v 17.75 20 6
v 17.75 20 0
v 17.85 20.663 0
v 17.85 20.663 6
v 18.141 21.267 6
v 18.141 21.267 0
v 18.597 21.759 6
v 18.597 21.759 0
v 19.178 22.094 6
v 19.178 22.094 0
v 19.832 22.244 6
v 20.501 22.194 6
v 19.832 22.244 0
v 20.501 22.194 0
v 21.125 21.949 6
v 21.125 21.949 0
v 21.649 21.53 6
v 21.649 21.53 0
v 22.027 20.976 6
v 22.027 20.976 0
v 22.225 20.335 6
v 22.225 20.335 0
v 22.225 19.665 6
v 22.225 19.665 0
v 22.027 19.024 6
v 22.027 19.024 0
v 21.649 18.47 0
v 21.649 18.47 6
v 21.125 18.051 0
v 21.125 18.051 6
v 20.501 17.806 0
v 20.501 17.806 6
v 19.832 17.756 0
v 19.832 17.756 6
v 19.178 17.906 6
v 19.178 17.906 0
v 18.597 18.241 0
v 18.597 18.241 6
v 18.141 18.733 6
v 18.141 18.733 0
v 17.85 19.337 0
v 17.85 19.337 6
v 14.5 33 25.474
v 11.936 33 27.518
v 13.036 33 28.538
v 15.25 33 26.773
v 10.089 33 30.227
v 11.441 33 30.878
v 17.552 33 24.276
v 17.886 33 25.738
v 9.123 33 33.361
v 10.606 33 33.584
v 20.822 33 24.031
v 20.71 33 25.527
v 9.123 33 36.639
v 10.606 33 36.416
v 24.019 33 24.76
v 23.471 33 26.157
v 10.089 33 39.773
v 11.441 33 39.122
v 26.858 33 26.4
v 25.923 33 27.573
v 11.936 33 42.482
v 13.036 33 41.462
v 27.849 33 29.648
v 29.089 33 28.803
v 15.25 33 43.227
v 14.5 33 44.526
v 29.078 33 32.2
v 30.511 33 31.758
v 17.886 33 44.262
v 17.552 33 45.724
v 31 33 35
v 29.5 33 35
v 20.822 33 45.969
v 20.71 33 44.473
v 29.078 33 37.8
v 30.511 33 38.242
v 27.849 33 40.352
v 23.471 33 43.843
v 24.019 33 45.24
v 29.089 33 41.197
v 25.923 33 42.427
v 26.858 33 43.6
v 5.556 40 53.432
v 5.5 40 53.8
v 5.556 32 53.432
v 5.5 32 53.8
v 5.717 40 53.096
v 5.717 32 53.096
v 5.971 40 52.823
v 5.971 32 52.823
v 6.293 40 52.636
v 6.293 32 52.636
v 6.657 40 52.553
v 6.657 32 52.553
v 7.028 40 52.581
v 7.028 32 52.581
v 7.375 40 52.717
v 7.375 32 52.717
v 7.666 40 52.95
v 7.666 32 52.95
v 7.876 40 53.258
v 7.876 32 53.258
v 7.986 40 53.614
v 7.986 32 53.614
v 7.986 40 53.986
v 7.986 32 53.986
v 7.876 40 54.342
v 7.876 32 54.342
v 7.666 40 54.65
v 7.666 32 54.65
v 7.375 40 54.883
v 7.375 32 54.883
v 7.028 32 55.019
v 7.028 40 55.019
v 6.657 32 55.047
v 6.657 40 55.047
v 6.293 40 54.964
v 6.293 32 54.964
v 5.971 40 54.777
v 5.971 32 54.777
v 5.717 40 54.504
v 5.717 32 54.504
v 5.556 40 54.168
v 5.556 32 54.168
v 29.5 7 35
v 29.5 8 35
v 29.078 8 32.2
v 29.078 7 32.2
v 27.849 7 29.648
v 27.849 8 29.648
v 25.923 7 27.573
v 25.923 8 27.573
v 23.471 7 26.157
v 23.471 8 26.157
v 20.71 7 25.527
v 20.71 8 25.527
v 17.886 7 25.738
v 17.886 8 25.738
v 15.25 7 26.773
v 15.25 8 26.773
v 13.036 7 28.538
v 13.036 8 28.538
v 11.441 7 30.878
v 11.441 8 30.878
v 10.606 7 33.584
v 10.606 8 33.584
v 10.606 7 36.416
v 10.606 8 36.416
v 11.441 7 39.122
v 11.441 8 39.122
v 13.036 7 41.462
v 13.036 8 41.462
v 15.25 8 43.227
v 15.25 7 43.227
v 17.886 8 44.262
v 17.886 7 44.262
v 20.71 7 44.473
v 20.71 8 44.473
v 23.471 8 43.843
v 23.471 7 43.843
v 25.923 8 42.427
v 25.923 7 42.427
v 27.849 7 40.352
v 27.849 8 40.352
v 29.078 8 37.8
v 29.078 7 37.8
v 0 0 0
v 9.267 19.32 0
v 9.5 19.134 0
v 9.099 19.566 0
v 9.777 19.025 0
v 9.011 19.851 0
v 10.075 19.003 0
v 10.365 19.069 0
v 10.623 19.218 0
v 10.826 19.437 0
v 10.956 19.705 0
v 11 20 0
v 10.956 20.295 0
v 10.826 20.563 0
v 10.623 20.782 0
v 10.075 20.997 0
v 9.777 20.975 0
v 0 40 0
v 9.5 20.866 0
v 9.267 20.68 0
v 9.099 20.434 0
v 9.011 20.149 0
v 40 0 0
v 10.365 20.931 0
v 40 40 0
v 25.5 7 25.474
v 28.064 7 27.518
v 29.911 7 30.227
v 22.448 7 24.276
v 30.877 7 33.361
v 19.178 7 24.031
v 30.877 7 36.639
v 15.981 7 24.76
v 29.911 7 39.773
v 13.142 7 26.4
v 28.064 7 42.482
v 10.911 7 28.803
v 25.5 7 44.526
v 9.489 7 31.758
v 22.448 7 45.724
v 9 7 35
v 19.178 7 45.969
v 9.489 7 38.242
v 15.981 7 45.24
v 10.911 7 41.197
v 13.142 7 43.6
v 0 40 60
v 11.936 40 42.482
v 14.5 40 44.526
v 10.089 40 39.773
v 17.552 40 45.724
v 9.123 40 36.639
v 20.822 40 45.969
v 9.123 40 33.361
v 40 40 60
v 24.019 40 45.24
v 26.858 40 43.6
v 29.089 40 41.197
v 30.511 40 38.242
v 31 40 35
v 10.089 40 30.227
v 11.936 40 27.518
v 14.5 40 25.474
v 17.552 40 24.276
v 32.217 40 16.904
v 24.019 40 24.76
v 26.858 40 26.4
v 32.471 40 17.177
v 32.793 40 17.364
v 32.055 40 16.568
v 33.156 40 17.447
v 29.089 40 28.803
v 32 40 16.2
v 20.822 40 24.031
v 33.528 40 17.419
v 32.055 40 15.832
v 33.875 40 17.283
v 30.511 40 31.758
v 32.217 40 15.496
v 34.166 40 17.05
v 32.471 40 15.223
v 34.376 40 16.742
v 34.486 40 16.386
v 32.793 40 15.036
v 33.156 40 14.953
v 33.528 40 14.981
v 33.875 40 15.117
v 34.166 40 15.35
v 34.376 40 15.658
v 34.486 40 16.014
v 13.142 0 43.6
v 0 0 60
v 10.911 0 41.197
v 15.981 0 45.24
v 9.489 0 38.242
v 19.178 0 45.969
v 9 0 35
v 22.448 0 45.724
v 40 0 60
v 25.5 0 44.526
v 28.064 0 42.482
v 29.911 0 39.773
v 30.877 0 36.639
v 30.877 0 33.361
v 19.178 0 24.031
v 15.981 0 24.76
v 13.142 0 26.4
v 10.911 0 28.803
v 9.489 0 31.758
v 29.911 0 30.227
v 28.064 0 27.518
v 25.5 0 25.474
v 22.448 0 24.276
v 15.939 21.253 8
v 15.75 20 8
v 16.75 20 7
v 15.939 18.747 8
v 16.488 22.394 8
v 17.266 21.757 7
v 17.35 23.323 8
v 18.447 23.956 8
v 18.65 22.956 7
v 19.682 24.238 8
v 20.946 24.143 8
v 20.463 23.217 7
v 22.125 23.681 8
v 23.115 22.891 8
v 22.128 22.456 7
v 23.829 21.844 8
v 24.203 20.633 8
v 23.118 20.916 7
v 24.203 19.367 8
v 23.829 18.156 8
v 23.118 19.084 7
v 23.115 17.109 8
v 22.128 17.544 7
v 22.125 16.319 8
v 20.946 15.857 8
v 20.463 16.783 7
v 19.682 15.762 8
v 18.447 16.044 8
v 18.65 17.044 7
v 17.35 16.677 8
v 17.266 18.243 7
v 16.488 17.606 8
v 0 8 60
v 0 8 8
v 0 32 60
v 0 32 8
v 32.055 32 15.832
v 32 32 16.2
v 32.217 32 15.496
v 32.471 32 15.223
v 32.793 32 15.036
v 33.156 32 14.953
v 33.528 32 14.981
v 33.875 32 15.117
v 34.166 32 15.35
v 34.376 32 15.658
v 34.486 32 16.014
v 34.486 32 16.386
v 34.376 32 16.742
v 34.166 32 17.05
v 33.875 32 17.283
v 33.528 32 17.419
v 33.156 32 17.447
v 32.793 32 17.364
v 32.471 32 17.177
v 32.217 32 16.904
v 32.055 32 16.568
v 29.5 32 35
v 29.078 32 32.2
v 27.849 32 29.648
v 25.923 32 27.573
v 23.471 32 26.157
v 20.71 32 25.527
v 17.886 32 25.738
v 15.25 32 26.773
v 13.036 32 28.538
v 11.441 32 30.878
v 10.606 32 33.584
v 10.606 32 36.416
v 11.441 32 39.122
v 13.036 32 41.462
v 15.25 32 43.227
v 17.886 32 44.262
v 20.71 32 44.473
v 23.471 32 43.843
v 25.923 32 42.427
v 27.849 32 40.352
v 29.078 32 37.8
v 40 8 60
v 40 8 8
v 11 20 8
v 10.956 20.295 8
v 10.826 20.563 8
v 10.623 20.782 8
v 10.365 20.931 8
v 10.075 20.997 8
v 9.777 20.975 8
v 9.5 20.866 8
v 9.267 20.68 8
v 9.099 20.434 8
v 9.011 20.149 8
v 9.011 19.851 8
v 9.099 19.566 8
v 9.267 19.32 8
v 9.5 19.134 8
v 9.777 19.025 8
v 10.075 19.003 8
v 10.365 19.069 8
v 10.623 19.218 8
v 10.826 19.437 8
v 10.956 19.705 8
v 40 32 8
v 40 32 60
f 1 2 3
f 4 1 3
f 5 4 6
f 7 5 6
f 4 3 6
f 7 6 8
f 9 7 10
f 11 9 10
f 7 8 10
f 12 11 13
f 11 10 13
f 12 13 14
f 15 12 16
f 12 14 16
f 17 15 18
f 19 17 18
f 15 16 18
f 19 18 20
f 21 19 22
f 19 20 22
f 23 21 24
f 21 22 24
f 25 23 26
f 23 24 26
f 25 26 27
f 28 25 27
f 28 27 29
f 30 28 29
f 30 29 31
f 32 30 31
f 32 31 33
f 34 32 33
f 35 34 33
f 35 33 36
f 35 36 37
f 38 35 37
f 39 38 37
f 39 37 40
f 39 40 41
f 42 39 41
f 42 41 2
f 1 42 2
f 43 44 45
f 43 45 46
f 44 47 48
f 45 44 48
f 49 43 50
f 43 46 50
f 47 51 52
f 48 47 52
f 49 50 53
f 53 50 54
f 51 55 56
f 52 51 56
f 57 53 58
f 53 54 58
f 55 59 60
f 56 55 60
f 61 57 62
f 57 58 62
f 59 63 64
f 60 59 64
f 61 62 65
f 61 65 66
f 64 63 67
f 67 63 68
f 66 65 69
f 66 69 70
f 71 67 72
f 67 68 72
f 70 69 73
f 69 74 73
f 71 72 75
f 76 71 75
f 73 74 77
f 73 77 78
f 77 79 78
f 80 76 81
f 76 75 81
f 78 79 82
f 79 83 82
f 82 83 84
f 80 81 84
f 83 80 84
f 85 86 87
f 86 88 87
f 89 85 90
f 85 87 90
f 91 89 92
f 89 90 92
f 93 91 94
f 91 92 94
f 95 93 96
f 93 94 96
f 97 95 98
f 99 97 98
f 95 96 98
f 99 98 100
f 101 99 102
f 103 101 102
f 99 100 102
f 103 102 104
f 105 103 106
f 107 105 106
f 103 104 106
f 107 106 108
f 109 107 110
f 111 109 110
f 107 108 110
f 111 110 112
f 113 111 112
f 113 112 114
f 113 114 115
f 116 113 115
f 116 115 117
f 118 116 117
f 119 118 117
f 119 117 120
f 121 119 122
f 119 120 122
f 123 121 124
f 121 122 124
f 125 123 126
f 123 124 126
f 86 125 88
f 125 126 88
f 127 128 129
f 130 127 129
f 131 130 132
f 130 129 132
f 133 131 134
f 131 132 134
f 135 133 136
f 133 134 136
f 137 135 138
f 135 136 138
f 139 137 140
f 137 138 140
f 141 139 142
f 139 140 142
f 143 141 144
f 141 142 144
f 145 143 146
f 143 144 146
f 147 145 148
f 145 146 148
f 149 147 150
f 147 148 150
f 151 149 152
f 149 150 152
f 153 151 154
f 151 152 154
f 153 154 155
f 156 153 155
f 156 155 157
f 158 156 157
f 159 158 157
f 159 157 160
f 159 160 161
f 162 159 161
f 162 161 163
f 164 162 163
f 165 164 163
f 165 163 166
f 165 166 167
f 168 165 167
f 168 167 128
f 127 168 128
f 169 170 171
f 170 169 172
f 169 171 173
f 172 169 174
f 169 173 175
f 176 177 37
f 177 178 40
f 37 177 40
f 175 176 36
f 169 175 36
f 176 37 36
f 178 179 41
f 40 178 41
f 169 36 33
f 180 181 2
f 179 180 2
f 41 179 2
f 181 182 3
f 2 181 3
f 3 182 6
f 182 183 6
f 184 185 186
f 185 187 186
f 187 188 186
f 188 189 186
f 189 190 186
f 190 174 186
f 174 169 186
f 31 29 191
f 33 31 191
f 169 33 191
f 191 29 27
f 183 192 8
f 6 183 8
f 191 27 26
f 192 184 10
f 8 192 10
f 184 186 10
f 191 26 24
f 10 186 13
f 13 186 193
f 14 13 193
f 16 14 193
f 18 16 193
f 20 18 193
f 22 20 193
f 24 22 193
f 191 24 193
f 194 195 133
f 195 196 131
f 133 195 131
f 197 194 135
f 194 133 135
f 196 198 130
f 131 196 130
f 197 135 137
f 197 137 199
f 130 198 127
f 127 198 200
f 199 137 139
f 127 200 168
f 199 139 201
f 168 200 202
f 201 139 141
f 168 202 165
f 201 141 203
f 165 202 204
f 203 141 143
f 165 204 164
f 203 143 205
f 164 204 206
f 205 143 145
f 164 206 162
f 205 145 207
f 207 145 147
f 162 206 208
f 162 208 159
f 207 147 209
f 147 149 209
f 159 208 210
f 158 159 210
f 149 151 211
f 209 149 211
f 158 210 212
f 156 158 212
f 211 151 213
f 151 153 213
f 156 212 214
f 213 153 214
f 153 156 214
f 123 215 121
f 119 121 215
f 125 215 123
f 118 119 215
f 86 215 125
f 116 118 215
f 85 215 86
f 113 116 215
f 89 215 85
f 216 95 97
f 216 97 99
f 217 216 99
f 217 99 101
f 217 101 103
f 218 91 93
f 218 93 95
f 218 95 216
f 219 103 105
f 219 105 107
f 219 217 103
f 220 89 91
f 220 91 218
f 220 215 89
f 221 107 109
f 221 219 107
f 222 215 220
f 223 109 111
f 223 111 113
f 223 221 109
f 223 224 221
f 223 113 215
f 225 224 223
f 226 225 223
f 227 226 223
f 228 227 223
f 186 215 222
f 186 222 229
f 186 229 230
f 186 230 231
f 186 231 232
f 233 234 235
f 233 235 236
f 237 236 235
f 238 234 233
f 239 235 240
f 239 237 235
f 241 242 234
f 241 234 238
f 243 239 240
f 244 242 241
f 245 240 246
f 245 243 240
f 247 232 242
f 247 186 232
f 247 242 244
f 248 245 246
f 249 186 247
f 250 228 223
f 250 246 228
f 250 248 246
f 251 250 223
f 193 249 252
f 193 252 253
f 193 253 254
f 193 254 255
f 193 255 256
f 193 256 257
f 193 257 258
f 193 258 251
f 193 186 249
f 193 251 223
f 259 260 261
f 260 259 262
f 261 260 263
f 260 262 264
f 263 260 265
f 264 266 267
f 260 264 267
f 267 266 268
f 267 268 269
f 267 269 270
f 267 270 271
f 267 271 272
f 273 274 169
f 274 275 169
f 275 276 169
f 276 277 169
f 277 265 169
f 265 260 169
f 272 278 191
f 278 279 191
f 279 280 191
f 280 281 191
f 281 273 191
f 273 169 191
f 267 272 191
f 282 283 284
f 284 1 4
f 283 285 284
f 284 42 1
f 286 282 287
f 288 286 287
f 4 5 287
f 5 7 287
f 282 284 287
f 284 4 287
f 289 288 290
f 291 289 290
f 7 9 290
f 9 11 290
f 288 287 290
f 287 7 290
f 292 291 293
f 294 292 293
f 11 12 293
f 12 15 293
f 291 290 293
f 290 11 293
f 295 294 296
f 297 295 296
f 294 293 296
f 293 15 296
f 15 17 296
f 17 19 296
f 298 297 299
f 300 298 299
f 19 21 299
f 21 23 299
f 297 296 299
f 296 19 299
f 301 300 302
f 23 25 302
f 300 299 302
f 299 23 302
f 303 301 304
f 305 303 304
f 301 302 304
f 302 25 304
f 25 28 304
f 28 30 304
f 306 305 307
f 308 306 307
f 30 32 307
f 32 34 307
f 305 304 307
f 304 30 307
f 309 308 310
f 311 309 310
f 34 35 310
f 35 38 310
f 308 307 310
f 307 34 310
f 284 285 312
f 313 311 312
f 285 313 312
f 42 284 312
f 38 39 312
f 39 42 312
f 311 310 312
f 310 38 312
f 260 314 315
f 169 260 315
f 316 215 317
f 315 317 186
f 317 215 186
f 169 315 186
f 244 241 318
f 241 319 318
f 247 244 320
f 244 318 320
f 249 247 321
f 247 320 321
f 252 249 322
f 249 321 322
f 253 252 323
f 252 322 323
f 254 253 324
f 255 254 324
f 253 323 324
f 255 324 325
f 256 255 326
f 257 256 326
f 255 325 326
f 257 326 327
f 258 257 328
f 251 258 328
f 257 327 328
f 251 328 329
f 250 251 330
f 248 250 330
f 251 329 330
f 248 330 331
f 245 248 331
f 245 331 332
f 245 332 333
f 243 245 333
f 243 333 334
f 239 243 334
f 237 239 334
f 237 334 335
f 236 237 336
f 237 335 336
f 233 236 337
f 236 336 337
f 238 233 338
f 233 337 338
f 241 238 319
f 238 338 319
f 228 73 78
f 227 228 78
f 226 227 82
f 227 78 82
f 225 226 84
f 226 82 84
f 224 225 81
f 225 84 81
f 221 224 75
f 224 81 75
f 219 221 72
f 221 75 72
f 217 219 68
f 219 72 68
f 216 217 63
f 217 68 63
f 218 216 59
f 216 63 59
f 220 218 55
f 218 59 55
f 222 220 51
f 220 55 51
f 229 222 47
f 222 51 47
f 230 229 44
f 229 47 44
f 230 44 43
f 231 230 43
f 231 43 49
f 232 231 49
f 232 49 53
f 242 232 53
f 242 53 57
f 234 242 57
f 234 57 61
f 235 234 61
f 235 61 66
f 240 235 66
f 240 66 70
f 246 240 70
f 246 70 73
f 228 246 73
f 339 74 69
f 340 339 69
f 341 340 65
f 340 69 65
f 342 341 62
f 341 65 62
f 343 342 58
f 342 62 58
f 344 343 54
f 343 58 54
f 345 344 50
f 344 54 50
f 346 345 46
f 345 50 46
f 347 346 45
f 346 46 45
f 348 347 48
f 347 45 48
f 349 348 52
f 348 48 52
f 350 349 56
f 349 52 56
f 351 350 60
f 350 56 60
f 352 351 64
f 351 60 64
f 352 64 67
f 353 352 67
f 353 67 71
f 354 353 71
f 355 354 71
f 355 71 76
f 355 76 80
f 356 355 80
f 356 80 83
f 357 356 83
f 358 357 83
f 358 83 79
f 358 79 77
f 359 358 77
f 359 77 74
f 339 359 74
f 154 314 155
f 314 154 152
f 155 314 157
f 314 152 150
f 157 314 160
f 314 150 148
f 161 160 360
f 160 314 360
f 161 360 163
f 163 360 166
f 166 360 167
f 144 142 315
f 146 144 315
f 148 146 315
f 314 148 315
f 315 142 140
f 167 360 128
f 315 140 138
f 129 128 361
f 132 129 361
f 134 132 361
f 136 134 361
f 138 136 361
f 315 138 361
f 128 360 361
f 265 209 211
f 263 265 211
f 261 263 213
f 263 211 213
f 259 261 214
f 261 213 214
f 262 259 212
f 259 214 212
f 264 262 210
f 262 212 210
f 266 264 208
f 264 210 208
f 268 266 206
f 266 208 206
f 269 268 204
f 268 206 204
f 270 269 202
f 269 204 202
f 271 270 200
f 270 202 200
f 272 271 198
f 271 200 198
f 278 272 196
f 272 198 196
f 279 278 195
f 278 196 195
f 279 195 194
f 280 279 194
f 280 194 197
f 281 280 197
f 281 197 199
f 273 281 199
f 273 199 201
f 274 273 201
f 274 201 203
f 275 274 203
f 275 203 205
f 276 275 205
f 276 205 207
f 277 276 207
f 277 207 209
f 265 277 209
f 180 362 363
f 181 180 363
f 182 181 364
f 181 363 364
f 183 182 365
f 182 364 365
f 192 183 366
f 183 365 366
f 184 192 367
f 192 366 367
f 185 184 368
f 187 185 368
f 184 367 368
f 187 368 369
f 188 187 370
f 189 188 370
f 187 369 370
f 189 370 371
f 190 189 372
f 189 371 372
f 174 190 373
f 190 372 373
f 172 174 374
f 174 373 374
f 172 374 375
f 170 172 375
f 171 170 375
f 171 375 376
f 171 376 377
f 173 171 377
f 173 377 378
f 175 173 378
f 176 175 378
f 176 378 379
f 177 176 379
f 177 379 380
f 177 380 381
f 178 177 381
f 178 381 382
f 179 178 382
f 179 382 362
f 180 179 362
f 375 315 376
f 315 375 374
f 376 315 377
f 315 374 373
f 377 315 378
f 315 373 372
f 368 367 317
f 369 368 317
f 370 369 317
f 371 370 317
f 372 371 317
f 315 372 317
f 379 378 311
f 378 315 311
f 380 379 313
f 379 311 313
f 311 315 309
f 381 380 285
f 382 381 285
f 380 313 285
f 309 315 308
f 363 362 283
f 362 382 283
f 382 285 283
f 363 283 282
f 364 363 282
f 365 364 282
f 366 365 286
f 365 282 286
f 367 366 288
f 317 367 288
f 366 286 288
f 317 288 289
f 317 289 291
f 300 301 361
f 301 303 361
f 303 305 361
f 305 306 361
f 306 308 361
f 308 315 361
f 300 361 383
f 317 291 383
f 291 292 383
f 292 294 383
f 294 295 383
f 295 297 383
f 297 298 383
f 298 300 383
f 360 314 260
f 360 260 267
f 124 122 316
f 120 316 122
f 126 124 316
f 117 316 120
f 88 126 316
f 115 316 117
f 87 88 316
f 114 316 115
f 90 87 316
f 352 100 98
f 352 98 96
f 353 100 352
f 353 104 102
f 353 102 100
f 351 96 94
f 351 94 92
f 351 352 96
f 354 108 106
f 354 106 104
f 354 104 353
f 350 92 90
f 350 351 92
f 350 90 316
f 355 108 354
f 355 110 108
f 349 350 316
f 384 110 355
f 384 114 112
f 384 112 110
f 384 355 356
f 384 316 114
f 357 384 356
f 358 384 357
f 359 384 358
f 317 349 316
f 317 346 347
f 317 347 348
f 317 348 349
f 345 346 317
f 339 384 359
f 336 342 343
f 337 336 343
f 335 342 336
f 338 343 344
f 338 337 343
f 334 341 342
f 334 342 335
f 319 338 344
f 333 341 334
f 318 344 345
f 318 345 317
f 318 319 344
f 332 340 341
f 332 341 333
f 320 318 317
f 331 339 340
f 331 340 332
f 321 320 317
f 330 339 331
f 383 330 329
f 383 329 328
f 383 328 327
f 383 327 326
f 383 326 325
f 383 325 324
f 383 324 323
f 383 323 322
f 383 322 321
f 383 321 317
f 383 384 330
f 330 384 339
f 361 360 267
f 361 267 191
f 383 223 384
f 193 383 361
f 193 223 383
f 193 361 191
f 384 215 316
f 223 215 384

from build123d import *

# Parameters (mm, degrees)
SKETCH1_W                      = 40
SKETCH1_H                      = 60
BOSS_EXTRUDE1_DEPTH            = 40
SKETCH2_W                      = 52
SKETCH2_H                      = 24
CUT_EXTRUDE1_DEPTH             = 83.462112512
F_4_5_4_5_DIAMETER_HOLE1_D     = 4.5
F_22_0_22_DIAMETER_HOLE2_D     = 22
F_22_0_22_DIAMETER_HOLE2_DEPTH = 7
F_22_0_22_DIAMETER_HOLE1_D     = 22
F_22_0_22_DIAMETER_HOLE1_DEPTH = 7
F_2_5_2_5_DIAMETER_HOLE1_D     = 2.5
F_2_5_2_5_DIAMETER_HOLE1_DEPTH = 8
F_2_5_2_5_DIAMETER_HOLE1_TIP   = 0.721687836
CHAMFER1_SIZE                  = 2
F_19_0_19_DIAMETER_HOLE1_D     = 19
F_2MM_PIN_REACH                = 78.837
SKETCH13_R                     = 1


with BuildPart() as part:
    # Sketch1 → Boss-Extrude1 (new body)
    with BuildSketch(Plane(origin=(0, 40, 0), x_dir=(1, 0, 0), z_dir=(0, 1, 0))):
        with Locations((20, -30)):
            Rectangle(SKETCH1_W, SKETCH1_H)
    extrude(amount=-BOSS_EXTRUDE1_DEPTH)

    # Sketch2 → Cut-Extrude1 (cut, through all)
    with BuildSketch(Plane(origin=(40, 0, 0), x_dir=(0, 0, -1), z_dir=(1, 0, 0))):
        with Locations((-34, 20)):
            Rectangle(SKETCH2_W, SKETCH2_H)
    extrude(amount=-CUT_EXTRUDE1_DEPTH, mode=Mode.SUBTRACT)

    # Ø4.5 (4.5) Diameter Hole1 (through all)
    with Locations(Plane.XY.offset(8)):
        with Locations((20, 20)):
            Hole(F_4_5_4_5_DIAMETER_HOLE1_D / 2)

    # Ø22.0 (22) Diameter Hole2
    with Locations(Plane(origin=(0, 40, 0), x_dir=(-1, 0, 0), z_dir=(0, 1, 0))):
        with Locations((-20, 35)):
            Hole(F_22_0_22_DIAMETER_HOLE2_D / 2, depth=F_22_0_22_DIAMETER_HOLE2_DEPTH)

    # Ø22.0 (22) Diameter Hole1
    with Locations(Plane.XZ):
        with Locations((20, 35)):
            Hole(F_22_0_22_DIAMETER_HOLE1_D / 2, depth=F_22_0_22_DIAMETER_HOLE1_DEPTH)

    # Ø2.5 (2.5) Diameter Hole1
    with Locations(Plane(origin=(0, 40, 0), x_dir=(1, 0, 0), z_dir=(0, 1, 0))):
        with Locations((33.24990566, -16.2), (6.75009434, -53.8)):
            Hole(F_2_5_2_5_DIAMETER_HOLE1_D / 2, depth=F_2_5_2_5_DIAMETER_HOLE1_DEPTH)
            with Locations((0, 0, -(F_2_5_2_5_DIAMETER_HOLE1_DEPTH + F_2_5_2_5_DIAMETER_HOLE1_TIP / 2))):  # 120° drill point
                Cone(0, F_2_5_2_5_DIAMETER_HOLE1_D / 2, F_2_5_2_5_DIAMETER_HOLE1_TIP, mode=Mode.SUBTRACT)

    # Chamfer1
    chamfer1_edges = [part.edges().sort_by_distance(p)[0] for p in [
        (22.25, 20, 8),
    ]]
    chamfer(chamfer1_edges, length=CHAMFER1_SIZE)

    # Ø19.0 (19) Diameter Hole1 (through all)
    with Locations(Plane(origin=(0, 7, 0), x_dir=(-1, 0, 0), z_dir=(0, -1, 0))):
        with Locations((-20, -35)):
            Hole(F_19_0_19_DIAMETER_HOLE1_D / 2)

    # Sketch13 → 2mm Pin (cut, up to next)
    with BuildSketch(Plane.XY.offset(8), mode=Mode.PRIVATE) as f_2mm_pin_sk1:
        with Locations((10, 20)):
            Circle(SKETCH13_R)
    f_2mm_pin_tool1 = extrude(f_2mm_pin_sk1.sketch, amount=-F_2MM_PIN_REACH, mode=Mode.PRIVATE) & part.part
    add(f_2mm_pin_tool1.solids().sort_by_distance((10, 20, 8))[0], mode=Mode.SUBTRACT)


solid = part.part
